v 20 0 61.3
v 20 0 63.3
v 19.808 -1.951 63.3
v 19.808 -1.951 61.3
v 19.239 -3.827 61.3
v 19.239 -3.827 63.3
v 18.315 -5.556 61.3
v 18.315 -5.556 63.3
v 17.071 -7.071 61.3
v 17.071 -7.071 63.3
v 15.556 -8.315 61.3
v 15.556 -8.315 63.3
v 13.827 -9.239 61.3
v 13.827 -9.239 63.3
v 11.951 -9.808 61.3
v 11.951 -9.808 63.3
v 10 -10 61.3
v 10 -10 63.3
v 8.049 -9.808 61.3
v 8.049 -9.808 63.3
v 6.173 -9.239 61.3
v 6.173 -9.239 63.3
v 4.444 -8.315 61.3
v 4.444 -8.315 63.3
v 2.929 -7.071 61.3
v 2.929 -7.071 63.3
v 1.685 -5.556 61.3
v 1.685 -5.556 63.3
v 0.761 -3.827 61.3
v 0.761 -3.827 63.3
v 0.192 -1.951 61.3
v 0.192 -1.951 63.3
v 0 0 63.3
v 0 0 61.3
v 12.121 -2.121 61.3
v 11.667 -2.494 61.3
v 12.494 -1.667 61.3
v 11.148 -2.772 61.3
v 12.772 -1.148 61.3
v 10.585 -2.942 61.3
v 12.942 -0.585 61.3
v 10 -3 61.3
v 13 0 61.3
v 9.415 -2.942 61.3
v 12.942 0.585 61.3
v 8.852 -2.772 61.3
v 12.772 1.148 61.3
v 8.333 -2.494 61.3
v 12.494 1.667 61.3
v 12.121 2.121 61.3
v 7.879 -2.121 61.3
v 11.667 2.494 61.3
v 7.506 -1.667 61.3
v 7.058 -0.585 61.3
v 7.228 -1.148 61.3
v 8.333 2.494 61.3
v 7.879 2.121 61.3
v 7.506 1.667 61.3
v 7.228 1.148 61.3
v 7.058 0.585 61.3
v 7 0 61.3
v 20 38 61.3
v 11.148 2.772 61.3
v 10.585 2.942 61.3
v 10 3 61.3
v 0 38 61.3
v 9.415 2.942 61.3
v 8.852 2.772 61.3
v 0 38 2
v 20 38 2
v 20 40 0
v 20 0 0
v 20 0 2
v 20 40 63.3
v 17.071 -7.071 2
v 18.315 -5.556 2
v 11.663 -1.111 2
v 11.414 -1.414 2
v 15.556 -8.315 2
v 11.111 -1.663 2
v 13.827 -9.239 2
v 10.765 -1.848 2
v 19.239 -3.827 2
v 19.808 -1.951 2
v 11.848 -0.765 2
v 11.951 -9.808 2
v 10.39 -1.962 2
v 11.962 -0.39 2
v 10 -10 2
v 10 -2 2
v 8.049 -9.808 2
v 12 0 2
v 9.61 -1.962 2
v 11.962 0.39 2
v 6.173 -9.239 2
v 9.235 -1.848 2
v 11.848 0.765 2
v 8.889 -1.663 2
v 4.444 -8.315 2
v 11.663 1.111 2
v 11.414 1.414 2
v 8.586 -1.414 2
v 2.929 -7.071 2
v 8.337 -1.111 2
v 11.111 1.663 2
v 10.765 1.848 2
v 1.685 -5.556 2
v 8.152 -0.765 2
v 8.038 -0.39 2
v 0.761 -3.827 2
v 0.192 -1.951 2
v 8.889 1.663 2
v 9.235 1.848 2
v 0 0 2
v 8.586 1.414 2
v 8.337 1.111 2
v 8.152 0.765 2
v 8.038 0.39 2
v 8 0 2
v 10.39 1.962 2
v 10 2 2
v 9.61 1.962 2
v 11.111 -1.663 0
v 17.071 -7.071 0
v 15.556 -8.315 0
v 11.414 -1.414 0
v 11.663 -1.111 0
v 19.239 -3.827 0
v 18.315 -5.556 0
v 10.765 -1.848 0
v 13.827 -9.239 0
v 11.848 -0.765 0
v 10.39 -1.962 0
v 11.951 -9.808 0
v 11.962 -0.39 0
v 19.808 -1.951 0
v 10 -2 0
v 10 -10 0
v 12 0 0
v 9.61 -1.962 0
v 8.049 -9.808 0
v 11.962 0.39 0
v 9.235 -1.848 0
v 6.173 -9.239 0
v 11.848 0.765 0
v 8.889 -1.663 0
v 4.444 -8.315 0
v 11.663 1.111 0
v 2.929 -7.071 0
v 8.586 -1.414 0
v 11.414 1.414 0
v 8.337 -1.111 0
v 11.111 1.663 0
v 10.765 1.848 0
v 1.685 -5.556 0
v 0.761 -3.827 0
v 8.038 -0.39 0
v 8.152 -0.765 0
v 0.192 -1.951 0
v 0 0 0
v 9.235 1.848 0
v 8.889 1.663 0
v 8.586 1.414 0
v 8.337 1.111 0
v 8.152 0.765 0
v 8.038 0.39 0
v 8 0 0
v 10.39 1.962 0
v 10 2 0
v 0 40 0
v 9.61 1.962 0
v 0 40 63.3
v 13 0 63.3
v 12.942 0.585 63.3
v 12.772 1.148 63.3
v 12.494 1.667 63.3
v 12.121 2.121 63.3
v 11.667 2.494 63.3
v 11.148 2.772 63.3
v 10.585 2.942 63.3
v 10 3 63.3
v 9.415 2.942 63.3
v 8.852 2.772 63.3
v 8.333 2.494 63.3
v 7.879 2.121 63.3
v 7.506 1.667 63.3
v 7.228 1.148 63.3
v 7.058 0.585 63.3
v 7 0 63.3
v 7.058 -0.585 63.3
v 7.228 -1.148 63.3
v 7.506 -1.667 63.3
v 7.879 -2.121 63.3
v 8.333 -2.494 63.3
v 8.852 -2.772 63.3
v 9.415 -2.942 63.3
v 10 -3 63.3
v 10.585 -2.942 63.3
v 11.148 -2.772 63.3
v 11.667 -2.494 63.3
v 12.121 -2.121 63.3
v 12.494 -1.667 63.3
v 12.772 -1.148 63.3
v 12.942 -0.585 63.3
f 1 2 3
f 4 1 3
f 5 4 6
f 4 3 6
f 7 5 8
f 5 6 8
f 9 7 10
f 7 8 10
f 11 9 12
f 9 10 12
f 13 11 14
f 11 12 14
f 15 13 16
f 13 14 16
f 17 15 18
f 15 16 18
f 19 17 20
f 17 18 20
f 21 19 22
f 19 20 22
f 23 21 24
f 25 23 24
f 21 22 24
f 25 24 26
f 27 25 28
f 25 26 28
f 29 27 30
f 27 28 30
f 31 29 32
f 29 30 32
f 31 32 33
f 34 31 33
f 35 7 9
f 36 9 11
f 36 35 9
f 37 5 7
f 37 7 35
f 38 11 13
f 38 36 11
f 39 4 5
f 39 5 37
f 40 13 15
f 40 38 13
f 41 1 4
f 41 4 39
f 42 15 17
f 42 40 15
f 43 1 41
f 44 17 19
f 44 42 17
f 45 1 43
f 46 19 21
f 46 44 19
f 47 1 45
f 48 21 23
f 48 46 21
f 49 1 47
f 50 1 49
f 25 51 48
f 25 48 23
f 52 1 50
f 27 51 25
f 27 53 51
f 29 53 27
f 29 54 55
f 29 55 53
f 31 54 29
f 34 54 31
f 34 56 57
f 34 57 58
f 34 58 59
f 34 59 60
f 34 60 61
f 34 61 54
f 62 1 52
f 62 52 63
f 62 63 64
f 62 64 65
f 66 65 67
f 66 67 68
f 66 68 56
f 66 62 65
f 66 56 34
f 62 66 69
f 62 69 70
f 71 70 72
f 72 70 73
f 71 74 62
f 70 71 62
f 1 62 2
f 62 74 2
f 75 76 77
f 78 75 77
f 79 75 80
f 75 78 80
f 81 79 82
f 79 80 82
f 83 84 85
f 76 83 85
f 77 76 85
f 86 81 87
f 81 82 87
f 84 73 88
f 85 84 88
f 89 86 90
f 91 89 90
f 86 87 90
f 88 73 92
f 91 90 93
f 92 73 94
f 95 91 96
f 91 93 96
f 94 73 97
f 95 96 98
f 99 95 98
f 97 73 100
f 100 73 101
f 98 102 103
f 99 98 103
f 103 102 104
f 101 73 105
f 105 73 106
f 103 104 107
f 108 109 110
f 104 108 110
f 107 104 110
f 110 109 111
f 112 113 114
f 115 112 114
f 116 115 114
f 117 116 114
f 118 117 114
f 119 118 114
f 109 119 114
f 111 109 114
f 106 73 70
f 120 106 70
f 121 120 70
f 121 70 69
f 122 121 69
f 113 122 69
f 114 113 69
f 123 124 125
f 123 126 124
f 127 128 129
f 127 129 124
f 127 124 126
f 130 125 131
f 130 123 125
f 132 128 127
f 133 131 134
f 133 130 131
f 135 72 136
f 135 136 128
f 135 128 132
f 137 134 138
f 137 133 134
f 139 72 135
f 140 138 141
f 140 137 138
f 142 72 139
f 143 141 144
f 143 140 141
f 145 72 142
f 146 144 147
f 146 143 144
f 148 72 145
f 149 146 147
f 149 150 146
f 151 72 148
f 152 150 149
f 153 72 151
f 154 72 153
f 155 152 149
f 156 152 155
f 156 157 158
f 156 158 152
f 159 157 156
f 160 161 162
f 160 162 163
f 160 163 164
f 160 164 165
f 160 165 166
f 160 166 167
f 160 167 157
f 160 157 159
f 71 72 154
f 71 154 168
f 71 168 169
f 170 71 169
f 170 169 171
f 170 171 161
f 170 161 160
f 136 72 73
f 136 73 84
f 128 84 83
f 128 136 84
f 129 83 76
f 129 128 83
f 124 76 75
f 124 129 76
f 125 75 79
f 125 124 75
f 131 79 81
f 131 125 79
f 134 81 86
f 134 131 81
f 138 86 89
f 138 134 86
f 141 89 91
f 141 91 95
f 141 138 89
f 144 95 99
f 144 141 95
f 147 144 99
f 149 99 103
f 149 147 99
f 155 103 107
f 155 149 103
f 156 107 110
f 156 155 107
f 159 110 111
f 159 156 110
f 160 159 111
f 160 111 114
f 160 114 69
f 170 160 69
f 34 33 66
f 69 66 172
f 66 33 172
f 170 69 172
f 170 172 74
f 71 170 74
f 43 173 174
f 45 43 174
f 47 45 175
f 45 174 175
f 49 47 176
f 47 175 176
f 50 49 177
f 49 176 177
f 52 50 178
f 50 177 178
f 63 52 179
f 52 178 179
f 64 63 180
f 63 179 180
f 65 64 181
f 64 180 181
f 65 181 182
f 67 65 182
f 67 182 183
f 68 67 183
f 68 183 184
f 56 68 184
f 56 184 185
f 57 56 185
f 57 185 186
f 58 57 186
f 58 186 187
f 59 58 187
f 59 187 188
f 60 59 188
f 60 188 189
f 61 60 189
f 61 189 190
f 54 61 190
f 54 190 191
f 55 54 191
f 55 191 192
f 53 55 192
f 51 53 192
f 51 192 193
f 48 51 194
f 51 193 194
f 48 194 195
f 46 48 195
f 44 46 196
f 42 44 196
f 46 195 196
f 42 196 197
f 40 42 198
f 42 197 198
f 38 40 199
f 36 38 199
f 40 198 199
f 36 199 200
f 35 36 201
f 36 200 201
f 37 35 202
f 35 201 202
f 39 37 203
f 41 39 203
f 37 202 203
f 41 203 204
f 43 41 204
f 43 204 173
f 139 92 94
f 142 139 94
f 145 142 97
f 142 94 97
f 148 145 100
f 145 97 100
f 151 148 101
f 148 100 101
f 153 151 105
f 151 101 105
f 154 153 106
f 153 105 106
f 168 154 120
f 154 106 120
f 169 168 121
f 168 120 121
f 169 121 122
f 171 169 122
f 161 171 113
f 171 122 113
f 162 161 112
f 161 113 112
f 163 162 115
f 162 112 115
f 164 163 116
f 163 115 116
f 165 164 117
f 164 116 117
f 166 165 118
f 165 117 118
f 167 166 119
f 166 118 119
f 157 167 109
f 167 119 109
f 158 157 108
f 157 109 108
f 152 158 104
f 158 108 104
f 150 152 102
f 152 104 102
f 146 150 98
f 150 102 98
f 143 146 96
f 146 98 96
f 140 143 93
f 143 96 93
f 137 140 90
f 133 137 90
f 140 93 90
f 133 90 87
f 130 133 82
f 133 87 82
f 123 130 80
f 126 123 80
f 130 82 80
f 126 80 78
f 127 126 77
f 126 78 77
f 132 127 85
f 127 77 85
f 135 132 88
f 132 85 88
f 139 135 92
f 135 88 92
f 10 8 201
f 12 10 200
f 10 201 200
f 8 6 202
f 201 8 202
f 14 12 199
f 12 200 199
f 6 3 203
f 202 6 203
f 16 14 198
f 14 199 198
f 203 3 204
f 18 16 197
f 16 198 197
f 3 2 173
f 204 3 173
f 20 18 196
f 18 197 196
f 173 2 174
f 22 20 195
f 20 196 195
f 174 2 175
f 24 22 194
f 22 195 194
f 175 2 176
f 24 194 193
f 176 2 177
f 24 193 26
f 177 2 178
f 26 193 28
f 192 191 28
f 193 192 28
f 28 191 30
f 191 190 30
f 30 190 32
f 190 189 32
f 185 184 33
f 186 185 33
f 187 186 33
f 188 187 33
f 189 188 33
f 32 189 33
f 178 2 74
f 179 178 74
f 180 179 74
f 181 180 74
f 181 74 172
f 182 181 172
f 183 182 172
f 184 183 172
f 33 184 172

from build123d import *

# Parameters (mm, degrees)
EXTRUDE_1_DEPTH     = 2
SKETCH_2_W          = 20
SKETCH_2_H          = 2
EXTRUDE_2_DEPTH     = 61.3
CUT_EXTRUDE_1_REACH = 79.504
SKETCH_4_R          = 3
SKETCH_6_R          = 2
CUT_EXTRUDE_2_DEPTH = 2


with BuildPart() as part:
    # 草图1 → 凸台-拉伸1 (new body)
    with BuildSketch(Plane.XY):
        with BuildLine():
            Line((0, 0), (0, 40))
            Line((0, 40), (20, 40))
            Line((20, 40), (20, 0))
            ThreePointArc((20, 0), (10, -10), (0, 0))
        make_face()
    extrude_1 = extrude(amount=EXTRUDE_1_DEPTH)

    # 草图2 → 凸台-拉伸2 (add)
    with BuildSketch(Plane.XY.offset(2)):
        with Locations((10, 39)):
            Rectangle(SKETCH_2_W, SKETCH_2_H)
    extrude(amount=EXTRUDE_2_DEPTH)

    # 镜向1: 凸台-拉伸1 across plane
    add(extrude_1.mirror(Plane.XY.offset(31.65)))

    # 草图4 → 切除-拉伸1 (cut, up to next)
    with BuildSketch(Plane.XY.offset(63.3), mode=Mode.PRIVATE) as cut_extrude_1_sk1:
        with Locations((10, 0)):
            Circle(SKETCH_4_R)
    cut_extrude_1_tool1 = extrude(cut_extrude_1_sk1.sketch, amount=-CUT_EXTRUDE_1_REACH, mode=Mode.PRIVATE) & part.part
    add(cut_extrude_1_tool1.solids().sort_by_distance((10, 0, 63.3))[0], mode=Mode.SUBTRACT)

    # 草图6 → 切除-拉伸2 (cut)
    with BuildSketch(Plane.XY.offset(2)):
        with Locations((10, 0)):
            Circle(SKETCH_6_R)
    extrude(amount=-CUT_EXTRUDE_2_DEPTH, mode=Mode.SUBTRACT)


solid = part.part
